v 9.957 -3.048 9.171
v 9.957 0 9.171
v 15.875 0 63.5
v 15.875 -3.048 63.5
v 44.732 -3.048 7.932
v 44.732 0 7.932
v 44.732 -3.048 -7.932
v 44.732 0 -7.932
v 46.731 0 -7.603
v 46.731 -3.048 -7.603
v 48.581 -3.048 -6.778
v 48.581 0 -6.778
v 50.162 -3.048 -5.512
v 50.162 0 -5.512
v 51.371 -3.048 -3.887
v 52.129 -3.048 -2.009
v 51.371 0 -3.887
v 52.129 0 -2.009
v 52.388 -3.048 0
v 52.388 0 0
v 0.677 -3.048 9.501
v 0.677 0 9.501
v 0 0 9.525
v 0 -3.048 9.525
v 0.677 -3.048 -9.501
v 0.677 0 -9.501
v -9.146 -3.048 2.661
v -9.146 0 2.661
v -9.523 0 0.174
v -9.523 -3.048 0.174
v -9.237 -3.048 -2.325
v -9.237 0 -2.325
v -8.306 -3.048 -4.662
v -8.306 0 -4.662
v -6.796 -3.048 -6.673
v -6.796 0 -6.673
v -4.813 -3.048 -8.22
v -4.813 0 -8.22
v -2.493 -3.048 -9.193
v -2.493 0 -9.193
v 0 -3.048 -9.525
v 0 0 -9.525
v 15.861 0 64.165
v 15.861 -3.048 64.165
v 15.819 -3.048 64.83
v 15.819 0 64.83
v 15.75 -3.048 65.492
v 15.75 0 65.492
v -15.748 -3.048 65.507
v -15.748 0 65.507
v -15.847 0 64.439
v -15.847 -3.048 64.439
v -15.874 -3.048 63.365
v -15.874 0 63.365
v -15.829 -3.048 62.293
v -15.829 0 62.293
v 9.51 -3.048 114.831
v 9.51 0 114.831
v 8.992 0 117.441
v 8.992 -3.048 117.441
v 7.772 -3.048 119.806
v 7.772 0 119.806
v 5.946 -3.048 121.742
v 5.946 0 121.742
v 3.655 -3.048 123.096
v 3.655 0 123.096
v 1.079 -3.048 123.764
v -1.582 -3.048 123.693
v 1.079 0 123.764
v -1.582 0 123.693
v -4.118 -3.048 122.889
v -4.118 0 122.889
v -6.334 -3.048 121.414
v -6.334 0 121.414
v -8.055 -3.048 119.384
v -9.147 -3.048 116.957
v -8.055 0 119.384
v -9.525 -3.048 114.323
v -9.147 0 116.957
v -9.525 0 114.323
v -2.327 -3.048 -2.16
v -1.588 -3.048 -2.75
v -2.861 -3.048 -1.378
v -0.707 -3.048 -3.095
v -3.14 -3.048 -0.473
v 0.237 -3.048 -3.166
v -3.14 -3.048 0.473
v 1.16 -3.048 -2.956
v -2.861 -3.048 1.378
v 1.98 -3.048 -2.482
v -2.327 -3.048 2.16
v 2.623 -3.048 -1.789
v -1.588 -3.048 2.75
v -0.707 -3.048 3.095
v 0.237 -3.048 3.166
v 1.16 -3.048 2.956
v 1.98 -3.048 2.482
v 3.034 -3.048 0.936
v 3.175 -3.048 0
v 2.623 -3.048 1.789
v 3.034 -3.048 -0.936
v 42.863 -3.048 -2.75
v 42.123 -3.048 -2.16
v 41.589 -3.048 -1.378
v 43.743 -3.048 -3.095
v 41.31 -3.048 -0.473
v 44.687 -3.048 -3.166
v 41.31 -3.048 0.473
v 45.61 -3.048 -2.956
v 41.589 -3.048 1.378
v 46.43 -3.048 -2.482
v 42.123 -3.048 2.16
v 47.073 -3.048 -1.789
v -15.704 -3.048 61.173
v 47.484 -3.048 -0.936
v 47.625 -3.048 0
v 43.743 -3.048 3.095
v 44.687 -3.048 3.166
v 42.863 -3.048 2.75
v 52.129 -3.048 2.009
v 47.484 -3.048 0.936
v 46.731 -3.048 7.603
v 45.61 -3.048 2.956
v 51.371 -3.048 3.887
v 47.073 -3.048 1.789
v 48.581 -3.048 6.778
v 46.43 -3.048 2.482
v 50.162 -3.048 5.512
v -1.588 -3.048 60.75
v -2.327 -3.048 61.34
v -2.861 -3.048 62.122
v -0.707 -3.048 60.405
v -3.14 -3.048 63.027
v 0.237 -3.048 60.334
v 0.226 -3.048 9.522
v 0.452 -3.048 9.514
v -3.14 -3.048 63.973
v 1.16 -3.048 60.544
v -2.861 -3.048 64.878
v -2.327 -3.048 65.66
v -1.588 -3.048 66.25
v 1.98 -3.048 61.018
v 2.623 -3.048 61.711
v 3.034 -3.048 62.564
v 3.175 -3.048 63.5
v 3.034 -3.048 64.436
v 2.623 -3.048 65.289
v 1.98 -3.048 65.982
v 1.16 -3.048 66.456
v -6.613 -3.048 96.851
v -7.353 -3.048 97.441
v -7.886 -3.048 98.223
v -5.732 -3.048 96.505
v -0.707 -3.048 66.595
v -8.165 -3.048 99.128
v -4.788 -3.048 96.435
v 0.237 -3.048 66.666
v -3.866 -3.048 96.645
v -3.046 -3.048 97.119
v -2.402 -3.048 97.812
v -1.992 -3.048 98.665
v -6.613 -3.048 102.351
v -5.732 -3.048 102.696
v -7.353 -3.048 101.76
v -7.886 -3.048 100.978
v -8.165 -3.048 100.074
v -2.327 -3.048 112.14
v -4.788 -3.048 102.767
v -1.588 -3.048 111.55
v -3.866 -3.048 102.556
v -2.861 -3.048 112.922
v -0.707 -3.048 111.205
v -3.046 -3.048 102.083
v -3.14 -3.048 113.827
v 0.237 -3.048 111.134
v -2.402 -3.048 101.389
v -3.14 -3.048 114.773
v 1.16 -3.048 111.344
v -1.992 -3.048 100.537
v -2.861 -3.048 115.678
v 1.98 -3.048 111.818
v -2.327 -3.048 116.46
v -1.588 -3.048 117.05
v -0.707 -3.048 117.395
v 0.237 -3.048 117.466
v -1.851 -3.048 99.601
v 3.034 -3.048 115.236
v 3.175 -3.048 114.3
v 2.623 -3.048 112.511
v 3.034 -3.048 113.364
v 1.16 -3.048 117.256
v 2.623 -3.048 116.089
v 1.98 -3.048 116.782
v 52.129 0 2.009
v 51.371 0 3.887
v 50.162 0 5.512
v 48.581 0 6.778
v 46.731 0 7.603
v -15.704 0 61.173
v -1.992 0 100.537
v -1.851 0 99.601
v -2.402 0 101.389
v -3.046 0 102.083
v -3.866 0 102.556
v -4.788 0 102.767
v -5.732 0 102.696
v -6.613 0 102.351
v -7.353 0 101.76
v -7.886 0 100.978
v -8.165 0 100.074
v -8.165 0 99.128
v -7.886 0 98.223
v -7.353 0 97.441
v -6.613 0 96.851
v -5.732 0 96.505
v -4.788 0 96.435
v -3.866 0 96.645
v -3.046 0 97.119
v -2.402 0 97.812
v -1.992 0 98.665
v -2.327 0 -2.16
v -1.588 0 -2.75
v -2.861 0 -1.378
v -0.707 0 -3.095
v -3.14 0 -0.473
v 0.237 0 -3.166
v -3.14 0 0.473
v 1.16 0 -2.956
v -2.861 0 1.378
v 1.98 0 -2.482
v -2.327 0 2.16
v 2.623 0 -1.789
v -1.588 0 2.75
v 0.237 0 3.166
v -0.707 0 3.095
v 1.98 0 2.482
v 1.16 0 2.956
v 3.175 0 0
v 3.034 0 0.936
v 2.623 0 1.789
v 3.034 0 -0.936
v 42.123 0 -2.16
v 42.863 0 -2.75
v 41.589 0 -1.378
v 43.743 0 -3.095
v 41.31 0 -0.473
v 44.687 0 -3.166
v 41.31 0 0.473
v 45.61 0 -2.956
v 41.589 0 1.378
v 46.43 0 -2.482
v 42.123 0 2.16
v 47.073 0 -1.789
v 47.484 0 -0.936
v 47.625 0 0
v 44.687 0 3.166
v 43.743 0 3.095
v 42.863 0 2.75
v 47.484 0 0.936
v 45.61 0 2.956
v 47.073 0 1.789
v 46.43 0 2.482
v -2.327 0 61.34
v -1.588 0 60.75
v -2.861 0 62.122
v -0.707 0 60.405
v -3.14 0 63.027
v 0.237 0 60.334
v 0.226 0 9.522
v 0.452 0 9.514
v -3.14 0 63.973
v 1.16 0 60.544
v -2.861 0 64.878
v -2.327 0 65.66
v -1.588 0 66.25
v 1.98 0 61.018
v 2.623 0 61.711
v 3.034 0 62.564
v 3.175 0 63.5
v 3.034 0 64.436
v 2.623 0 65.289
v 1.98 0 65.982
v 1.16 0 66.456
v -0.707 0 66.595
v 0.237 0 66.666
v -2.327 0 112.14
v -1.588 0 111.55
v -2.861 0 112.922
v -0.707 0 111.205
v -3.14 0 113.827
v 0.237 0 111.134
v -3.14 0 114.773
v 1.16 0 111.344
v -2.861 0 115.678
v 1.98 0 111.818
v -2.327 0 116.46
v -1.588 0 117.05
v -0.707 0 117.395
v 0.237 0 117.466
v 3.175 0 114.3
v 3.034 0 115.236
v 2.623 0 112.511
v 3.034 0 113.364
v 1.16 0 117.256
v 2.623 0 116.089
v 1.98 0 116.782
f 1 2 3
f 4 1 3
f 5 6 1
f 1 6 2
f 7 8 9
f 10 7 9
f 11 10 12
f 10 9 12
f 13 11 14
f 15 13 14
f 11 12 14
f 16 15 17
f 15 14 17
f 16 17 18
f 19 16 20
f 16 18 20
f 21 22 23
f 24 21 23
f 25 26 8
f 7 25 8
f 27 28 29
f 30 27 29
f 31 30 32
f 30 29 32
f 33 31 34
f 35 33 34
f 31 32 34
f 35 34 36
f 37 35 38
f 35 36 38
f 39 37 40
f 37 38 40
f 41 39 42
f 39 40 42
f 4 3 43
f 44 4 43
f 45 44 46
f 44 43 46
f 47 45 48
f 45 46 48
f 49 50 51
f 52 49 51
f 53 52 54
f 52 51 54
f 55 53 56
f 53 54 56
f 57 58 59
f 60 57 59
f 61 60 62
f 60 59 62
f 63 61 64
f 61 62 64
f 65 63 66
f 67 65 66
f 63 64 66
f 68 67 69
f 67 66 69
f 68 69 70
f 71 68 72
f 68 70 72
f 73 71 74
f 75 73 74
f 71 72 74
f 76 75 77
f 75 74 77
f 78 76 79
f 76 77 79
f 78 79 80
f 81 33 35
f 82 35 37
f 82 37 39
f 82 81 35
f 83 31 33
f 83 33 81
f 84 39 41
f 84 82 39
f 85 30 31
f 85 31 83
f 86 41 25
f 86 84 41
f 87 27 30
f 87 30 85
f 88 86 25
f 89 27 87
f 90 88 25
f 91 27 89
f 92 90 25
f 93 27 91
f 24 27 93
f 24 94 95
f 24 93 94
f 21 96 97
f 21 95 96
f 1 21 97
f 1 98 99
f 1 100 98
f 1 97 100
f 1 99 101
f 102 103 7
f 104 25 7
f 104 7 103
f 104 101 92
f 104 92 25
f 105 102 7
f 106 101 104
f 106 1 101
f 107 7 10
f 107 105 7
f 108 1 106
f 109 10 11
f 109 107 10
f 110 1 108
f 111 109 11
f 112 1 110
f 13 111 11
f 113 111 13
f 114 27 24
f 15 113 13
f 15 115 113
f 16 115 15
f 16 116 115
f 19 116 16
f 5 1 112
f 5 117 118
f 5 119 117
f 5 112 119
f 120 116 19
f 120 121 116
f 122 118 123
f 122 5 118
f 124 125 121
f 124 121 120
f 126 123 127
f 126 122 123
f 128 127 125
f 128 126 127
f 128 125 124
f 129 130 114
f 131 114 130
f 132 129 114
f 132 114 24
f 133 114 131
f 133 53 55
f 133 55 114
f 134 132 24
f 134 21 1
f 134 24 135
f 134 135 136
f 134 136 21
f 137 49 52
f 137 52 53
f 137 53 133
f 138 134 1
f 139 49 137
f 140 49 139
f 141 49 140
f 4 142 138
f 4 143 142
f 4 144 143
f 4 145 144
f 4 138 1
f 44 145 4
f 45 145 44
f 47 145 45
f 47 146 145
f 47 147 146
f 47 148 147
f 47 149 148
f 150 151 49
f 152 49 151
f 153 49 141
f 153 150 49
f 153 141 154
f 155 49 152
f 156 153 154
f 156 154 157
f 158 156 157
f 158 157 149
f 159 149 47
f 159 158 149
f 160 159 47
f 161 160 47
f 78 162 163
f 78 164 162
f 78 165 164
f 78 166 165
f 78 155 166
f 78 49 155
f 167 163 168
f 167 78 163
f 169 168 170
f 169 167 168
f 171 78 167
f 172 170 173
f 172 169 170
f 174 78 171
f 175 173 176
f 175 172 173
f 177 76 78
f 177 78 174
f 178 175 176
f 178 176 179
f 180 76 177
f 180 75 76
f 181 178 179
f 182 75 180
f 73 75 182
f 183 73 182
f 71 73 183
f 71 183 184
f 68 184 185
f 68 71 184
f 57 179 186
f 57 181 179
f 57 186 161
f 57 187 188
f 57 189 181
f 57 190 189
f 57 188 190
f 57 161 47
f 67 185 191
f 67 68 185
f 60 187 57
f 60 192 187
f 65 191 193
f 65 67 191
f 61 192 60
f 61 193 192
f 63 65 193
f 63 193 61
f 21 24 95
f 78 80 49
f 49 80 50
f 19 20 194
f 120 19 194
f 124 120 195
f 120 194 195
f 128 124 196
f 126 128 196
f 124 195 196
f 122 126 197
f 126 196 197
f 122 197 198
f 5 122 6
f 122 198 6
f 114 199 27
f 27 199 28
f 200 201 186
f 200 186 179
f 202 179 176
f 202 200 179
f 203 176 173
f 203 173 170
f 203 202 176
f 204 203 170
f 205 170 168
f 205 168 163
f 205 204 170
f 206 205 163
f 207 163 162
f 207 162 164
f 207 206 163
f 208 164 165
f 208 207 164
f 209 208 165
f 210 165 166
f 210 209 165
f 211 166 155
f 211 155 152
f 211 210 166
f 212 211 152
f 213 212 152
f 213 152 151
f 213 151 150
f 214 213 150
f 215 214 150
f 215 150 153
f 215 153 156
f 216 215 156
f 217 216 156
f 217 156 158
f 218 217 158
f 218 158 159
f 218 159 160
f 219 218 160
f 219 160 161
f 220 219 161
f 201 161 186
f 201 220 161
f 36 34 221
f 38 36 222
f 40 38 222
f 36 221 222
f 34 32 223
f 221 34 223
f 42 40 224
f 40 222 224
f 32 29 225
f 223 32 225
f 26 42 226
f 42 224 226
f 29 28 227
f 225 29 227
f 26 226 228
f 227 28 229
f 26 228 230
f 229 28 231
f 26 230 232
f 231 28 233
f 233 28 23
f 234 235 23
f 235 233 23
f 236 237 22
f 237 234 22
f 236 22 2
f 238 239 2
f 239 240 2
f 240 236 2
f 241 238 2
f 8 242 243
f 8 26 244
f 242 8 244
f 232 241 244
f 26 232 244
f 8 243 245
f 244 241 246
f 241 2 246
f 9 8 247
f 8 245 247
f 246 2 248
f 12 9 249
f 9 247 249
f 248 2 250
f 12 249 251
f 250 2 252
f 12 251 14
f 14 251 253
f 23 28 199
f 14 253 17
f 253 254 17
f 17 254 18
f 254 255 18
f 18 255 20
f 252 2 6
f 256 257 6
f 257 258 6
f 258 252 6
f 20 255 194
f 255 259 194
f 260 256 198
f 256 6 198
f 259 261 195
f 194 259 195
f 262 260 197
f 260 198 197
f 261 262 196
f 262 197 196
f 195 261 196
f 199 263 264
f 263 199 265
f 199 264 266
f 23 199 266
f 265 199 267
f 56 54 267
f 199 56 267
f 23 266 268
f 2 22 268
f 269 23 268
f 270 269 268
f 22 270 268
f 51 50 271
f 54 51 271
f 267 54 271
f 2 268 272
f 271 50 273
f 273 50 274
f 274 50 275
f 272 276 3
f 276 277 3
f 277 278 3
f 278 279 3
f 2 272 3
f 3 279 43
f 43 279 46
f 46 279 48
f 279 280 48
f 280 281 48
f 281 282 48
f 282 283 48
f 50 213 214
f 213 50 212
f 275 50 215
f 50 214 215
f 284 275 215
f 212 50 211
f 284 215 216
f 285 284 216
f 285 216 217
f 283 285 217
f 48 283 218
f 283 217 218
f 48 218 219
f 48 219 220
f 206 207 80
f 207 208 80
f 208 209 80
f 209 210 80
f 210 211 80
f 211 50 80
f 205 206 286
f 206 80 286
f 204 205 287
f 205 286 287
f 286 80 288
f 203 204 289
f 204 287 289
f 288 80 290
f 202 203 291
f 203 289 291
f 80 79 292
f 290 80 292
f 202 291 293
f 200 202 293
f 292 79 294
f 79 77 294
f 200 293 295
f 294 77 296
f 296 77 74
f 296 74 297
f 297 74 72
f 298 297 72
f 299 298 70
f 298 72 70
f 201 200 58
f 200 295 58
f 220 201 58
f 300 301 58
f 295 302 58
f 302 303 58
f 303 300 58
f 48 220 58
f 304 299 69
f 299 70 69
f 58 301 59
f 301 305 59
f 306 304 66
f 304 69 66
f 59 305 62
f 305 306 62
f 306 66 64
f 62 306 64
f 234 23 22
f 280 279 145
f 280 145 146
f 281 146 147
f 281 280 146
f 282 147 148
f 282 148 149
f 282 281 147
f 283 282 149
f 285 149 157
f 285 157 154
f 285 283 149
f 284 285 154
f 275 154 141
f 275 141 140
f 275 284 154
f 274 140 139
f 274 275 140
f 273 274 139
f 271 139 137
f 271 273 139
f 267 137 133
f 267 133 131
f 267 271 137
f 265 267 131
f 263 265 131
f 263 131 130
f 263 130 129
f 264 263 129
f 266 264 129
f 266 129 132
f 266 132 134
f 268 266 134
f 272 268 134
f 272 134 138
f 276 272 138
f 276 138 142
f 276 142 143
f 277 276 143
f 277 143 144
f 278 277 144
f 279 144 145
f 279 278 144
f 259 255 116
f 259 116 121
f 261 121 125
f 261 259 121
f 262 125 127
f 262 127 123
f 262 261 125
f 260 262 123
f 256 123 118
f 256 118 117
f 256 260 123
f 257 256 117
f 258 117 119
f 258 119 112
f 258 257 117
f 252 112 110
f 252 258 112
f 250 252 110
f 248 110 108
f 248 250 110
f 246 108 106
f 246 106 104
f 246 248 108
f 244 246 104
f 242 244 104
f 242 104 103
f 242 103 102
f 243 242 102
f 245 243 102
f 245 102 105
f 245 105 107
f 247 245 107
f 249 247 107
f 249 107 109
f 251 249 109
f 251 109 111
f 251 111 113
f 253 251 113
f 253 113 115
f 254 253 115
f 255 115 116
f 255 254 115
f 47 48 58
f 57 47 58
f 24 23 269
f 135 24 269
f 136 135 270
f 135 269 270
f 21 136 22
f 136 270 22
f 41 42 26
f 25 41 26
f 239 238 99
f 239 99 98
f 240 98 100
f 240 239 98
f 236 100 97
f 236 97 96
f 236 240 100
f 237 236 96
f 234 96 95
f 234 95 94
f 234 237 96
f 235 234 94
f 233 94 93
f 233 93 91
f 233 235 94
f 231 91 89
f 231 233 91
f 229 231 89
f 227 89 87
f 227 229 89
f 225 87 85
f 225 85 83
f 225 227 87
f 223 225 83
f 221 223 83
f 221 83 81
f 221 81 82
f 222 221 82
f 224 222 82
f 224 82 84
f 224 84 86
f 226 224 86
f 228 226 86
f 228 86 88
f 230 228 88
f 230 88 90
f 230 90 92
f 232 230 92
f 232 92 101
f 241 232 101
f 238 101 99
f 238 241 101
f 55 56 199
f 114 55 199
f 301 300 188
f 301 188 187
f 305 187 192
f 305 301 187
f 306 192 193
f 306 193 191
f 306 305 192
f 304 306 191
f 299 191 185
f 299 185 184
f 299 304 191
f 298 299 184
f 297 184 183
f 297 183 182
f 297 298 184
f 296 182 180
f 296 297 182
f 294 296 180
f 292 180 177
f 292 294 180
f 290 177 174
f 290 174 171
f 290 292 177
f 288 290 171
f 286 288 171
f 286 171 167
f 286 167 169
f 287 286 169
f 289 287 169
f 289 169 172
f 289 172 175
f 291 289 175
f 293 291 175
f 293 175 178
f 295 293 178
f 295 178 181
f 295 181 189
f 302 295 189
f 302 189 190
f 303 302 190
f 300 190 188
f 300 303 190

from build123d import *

# Parameters (mm, degrees)
F0_R     = 3.175
F1_DEPTH = 3.048


with BuildPart() as f1:
    # F0 (on Front) → F1 (new body)
    with BuildSketch(Plane.XZ):
        with BuildLine():
            ThreePointArc((9.5102028503, 114.8307245366), (9.5213000643, 114.5654653895), (9.5250000939, 114.3))
            ThreePointArc((9.5250000939, 114.3), (-0.0114906805, 104.7750068372), (-9.5249723698, 114.3229813443))
            Line((-9.5249723698, 114.3229813443), (-15.747574407, 65.5073677534))
            ThreePointArc((-15.747574407, 65.5073677534), (0.0079100828, 79.3749980293), (15.7495670212, 65.4916735785))
            Line((15.7495670212, 65.4916735785), (9.5102028503, 114.8307245366))
        make_face()
        with Locations((-5.025569471, 99.6008760627)):
            Circle(F0_R, mode=Mode.SUBTRACT)
        with BuildLine():
            ThreePointArc((15.875, 63.5), (15.8436107227, 64.4978097358), (15.7495670212, 65.4916735785))
            ThreePointArc((15.7495670212, 65.4916735785), (0.0079100828, 79.3749980293), (-15.747574407, 65.5073677534))
            ThreePointArc((-15.747574407, 65.5073677534), (-15.8699038317, 63.9022155787), (-15.8290429523, 62.292927419))
            Line((-15.8290429523, 62.292927419), (-15.7035347362, 61.1730660111))
            ThreePointArc((-15.7035347362, 61.1730660111), (-0.5546795069, 47.6346933328), (15.5026829919, 60.0820408059))
            Line((15.5026829919, 60.0820408059), (15.875, 63.5))
        make_face()
        with Locations((0, 63.5)):
            Circle(F0_R, mode=Mode.SUBTRACT)
        with BuildLine():
            Line((9.9569104682, 9.1705224667), (15.5026829919, 60.0820408059))
            ThreePointArc((15.5026829919, 60.0820408059), (-0.5546795069, 47.6346933328), (-15.7035347362, 61.1730660111))
            Line((-15.7035347362, 61.1730660111), (-9.1457913245, 2.6608506249))
            ThreePointArc((-9.1457913245, 2.6608506249), (-5.7175616655, 7.6180780779), (0, 9.525))
            ThreePointArc((0, 9.525), (0.3388863295, 9.5189695375), (0.6773435479, 9.500885786))
            Line((0.6773435479, 9.500885786), (9.9569104682, 9.1705224667))
        make_face()
        with BuildLine():
            ThreePointArc((0, 9.525), (-5.7175616655, 7.6180780779), (-9.1457913245, 2.6608506249))
            ThreePointArc((-9.1457913245, 2.6608506249), (-7.6180780779, -5.7175616655), (0, -9.525))
            Line((0, -9.525), (0.6773435479, -9.500885786))
            ThreePointArc((0.6773435479, -9.500885786), (6.9705567315, -6.4912990883), (9.525, 0))
            ThreePointArc((9.525, 0), (9.4481631595, 1.207409587), (9.2188923022, 2.395339166))
            ThreePointArc((9.2188923022, 2.395339166), (6.0914751245, 7.3225375252), (0.6773435479, 9.500885786))
            Line((0.6773435479, 9.500885786), (0, 9.525))
        make_face()
        Circle(F0_R, mode=Mode.SUBTRACT)
        with BuildLine():
            Line((44.7324052746, 7.9324746146), (9.9569104682, 9.1705224667))
            Line((9.9569104682, 9.1705224667), (9.2188923022, 2.395339166))
            ThreePointArc((9.2188923022, 2.395339166), (9.4481631595, 1.207409587), (9.525, 0))
            ThreePointArc((9.525, 0), (6.9705567315, -6.4912990883), (0.6773435479, -9.500885786))
            Line((0.6773435479, -9.500885786), (44.7324052746, -7.9324746146))
            ThreePointArc((44.7324052746, -7.9324746146), (36.5125, 0), (44.7324052746, 7.9324746146))
        make_face()
        with BuildLine():
            Line((9.2188923022, 2.395339166), (9.9569104682, 9.1705224667))
            Line((9.9569104682, 9.1705224667), (0.6773435479, 9.500885786))
            ThreePointArc((0.6773435479, 9.500885786), (6.0914751245, 7.3225375252), (9.2188923022, 2.395339166))
        make_face()
        with BuildLine():
            ThreePointArc((52.3875, 0), (50.1616327839, 5.5119104847), (44.7324052746, 7.9324746146))
            ThreePointArc((44.7324052746, 7.9324746146), (36.5125, 0), (44.7324052746, -7.9324746146))
            ThreePointArc((44.7324052746, -7.9324746146), (50.1616327839, -5.5119104847), (52.3875, 0))
        make_face()
        with Locations((44.45, 0)):
            Circle(F0_R, mode=Mode.SUBTRACT)
        with BuildLine():
            ThreePointArc((-9.5249723698, 114.3229813443), (-0.0114906805, 104.7750068372), (9.5250000939, 114.3))
            ThreePointArc((9.5250000939, 114.3), (9.5213000643, 114.5654653895), (9.5102028503, 114.8307245366))
            ThreePointArc((9.5102028503, 114.8307245366), (-0.2539789795, 123.8216133857), (-9.5249723698, 114.3229813443))
        make_face()
        with Locations((0, 114.3)):
            Circle(F0_R, mode=Mode.SUBTRACT)
    extrude(amount=F1_DEPTH)


solid = f1.part
